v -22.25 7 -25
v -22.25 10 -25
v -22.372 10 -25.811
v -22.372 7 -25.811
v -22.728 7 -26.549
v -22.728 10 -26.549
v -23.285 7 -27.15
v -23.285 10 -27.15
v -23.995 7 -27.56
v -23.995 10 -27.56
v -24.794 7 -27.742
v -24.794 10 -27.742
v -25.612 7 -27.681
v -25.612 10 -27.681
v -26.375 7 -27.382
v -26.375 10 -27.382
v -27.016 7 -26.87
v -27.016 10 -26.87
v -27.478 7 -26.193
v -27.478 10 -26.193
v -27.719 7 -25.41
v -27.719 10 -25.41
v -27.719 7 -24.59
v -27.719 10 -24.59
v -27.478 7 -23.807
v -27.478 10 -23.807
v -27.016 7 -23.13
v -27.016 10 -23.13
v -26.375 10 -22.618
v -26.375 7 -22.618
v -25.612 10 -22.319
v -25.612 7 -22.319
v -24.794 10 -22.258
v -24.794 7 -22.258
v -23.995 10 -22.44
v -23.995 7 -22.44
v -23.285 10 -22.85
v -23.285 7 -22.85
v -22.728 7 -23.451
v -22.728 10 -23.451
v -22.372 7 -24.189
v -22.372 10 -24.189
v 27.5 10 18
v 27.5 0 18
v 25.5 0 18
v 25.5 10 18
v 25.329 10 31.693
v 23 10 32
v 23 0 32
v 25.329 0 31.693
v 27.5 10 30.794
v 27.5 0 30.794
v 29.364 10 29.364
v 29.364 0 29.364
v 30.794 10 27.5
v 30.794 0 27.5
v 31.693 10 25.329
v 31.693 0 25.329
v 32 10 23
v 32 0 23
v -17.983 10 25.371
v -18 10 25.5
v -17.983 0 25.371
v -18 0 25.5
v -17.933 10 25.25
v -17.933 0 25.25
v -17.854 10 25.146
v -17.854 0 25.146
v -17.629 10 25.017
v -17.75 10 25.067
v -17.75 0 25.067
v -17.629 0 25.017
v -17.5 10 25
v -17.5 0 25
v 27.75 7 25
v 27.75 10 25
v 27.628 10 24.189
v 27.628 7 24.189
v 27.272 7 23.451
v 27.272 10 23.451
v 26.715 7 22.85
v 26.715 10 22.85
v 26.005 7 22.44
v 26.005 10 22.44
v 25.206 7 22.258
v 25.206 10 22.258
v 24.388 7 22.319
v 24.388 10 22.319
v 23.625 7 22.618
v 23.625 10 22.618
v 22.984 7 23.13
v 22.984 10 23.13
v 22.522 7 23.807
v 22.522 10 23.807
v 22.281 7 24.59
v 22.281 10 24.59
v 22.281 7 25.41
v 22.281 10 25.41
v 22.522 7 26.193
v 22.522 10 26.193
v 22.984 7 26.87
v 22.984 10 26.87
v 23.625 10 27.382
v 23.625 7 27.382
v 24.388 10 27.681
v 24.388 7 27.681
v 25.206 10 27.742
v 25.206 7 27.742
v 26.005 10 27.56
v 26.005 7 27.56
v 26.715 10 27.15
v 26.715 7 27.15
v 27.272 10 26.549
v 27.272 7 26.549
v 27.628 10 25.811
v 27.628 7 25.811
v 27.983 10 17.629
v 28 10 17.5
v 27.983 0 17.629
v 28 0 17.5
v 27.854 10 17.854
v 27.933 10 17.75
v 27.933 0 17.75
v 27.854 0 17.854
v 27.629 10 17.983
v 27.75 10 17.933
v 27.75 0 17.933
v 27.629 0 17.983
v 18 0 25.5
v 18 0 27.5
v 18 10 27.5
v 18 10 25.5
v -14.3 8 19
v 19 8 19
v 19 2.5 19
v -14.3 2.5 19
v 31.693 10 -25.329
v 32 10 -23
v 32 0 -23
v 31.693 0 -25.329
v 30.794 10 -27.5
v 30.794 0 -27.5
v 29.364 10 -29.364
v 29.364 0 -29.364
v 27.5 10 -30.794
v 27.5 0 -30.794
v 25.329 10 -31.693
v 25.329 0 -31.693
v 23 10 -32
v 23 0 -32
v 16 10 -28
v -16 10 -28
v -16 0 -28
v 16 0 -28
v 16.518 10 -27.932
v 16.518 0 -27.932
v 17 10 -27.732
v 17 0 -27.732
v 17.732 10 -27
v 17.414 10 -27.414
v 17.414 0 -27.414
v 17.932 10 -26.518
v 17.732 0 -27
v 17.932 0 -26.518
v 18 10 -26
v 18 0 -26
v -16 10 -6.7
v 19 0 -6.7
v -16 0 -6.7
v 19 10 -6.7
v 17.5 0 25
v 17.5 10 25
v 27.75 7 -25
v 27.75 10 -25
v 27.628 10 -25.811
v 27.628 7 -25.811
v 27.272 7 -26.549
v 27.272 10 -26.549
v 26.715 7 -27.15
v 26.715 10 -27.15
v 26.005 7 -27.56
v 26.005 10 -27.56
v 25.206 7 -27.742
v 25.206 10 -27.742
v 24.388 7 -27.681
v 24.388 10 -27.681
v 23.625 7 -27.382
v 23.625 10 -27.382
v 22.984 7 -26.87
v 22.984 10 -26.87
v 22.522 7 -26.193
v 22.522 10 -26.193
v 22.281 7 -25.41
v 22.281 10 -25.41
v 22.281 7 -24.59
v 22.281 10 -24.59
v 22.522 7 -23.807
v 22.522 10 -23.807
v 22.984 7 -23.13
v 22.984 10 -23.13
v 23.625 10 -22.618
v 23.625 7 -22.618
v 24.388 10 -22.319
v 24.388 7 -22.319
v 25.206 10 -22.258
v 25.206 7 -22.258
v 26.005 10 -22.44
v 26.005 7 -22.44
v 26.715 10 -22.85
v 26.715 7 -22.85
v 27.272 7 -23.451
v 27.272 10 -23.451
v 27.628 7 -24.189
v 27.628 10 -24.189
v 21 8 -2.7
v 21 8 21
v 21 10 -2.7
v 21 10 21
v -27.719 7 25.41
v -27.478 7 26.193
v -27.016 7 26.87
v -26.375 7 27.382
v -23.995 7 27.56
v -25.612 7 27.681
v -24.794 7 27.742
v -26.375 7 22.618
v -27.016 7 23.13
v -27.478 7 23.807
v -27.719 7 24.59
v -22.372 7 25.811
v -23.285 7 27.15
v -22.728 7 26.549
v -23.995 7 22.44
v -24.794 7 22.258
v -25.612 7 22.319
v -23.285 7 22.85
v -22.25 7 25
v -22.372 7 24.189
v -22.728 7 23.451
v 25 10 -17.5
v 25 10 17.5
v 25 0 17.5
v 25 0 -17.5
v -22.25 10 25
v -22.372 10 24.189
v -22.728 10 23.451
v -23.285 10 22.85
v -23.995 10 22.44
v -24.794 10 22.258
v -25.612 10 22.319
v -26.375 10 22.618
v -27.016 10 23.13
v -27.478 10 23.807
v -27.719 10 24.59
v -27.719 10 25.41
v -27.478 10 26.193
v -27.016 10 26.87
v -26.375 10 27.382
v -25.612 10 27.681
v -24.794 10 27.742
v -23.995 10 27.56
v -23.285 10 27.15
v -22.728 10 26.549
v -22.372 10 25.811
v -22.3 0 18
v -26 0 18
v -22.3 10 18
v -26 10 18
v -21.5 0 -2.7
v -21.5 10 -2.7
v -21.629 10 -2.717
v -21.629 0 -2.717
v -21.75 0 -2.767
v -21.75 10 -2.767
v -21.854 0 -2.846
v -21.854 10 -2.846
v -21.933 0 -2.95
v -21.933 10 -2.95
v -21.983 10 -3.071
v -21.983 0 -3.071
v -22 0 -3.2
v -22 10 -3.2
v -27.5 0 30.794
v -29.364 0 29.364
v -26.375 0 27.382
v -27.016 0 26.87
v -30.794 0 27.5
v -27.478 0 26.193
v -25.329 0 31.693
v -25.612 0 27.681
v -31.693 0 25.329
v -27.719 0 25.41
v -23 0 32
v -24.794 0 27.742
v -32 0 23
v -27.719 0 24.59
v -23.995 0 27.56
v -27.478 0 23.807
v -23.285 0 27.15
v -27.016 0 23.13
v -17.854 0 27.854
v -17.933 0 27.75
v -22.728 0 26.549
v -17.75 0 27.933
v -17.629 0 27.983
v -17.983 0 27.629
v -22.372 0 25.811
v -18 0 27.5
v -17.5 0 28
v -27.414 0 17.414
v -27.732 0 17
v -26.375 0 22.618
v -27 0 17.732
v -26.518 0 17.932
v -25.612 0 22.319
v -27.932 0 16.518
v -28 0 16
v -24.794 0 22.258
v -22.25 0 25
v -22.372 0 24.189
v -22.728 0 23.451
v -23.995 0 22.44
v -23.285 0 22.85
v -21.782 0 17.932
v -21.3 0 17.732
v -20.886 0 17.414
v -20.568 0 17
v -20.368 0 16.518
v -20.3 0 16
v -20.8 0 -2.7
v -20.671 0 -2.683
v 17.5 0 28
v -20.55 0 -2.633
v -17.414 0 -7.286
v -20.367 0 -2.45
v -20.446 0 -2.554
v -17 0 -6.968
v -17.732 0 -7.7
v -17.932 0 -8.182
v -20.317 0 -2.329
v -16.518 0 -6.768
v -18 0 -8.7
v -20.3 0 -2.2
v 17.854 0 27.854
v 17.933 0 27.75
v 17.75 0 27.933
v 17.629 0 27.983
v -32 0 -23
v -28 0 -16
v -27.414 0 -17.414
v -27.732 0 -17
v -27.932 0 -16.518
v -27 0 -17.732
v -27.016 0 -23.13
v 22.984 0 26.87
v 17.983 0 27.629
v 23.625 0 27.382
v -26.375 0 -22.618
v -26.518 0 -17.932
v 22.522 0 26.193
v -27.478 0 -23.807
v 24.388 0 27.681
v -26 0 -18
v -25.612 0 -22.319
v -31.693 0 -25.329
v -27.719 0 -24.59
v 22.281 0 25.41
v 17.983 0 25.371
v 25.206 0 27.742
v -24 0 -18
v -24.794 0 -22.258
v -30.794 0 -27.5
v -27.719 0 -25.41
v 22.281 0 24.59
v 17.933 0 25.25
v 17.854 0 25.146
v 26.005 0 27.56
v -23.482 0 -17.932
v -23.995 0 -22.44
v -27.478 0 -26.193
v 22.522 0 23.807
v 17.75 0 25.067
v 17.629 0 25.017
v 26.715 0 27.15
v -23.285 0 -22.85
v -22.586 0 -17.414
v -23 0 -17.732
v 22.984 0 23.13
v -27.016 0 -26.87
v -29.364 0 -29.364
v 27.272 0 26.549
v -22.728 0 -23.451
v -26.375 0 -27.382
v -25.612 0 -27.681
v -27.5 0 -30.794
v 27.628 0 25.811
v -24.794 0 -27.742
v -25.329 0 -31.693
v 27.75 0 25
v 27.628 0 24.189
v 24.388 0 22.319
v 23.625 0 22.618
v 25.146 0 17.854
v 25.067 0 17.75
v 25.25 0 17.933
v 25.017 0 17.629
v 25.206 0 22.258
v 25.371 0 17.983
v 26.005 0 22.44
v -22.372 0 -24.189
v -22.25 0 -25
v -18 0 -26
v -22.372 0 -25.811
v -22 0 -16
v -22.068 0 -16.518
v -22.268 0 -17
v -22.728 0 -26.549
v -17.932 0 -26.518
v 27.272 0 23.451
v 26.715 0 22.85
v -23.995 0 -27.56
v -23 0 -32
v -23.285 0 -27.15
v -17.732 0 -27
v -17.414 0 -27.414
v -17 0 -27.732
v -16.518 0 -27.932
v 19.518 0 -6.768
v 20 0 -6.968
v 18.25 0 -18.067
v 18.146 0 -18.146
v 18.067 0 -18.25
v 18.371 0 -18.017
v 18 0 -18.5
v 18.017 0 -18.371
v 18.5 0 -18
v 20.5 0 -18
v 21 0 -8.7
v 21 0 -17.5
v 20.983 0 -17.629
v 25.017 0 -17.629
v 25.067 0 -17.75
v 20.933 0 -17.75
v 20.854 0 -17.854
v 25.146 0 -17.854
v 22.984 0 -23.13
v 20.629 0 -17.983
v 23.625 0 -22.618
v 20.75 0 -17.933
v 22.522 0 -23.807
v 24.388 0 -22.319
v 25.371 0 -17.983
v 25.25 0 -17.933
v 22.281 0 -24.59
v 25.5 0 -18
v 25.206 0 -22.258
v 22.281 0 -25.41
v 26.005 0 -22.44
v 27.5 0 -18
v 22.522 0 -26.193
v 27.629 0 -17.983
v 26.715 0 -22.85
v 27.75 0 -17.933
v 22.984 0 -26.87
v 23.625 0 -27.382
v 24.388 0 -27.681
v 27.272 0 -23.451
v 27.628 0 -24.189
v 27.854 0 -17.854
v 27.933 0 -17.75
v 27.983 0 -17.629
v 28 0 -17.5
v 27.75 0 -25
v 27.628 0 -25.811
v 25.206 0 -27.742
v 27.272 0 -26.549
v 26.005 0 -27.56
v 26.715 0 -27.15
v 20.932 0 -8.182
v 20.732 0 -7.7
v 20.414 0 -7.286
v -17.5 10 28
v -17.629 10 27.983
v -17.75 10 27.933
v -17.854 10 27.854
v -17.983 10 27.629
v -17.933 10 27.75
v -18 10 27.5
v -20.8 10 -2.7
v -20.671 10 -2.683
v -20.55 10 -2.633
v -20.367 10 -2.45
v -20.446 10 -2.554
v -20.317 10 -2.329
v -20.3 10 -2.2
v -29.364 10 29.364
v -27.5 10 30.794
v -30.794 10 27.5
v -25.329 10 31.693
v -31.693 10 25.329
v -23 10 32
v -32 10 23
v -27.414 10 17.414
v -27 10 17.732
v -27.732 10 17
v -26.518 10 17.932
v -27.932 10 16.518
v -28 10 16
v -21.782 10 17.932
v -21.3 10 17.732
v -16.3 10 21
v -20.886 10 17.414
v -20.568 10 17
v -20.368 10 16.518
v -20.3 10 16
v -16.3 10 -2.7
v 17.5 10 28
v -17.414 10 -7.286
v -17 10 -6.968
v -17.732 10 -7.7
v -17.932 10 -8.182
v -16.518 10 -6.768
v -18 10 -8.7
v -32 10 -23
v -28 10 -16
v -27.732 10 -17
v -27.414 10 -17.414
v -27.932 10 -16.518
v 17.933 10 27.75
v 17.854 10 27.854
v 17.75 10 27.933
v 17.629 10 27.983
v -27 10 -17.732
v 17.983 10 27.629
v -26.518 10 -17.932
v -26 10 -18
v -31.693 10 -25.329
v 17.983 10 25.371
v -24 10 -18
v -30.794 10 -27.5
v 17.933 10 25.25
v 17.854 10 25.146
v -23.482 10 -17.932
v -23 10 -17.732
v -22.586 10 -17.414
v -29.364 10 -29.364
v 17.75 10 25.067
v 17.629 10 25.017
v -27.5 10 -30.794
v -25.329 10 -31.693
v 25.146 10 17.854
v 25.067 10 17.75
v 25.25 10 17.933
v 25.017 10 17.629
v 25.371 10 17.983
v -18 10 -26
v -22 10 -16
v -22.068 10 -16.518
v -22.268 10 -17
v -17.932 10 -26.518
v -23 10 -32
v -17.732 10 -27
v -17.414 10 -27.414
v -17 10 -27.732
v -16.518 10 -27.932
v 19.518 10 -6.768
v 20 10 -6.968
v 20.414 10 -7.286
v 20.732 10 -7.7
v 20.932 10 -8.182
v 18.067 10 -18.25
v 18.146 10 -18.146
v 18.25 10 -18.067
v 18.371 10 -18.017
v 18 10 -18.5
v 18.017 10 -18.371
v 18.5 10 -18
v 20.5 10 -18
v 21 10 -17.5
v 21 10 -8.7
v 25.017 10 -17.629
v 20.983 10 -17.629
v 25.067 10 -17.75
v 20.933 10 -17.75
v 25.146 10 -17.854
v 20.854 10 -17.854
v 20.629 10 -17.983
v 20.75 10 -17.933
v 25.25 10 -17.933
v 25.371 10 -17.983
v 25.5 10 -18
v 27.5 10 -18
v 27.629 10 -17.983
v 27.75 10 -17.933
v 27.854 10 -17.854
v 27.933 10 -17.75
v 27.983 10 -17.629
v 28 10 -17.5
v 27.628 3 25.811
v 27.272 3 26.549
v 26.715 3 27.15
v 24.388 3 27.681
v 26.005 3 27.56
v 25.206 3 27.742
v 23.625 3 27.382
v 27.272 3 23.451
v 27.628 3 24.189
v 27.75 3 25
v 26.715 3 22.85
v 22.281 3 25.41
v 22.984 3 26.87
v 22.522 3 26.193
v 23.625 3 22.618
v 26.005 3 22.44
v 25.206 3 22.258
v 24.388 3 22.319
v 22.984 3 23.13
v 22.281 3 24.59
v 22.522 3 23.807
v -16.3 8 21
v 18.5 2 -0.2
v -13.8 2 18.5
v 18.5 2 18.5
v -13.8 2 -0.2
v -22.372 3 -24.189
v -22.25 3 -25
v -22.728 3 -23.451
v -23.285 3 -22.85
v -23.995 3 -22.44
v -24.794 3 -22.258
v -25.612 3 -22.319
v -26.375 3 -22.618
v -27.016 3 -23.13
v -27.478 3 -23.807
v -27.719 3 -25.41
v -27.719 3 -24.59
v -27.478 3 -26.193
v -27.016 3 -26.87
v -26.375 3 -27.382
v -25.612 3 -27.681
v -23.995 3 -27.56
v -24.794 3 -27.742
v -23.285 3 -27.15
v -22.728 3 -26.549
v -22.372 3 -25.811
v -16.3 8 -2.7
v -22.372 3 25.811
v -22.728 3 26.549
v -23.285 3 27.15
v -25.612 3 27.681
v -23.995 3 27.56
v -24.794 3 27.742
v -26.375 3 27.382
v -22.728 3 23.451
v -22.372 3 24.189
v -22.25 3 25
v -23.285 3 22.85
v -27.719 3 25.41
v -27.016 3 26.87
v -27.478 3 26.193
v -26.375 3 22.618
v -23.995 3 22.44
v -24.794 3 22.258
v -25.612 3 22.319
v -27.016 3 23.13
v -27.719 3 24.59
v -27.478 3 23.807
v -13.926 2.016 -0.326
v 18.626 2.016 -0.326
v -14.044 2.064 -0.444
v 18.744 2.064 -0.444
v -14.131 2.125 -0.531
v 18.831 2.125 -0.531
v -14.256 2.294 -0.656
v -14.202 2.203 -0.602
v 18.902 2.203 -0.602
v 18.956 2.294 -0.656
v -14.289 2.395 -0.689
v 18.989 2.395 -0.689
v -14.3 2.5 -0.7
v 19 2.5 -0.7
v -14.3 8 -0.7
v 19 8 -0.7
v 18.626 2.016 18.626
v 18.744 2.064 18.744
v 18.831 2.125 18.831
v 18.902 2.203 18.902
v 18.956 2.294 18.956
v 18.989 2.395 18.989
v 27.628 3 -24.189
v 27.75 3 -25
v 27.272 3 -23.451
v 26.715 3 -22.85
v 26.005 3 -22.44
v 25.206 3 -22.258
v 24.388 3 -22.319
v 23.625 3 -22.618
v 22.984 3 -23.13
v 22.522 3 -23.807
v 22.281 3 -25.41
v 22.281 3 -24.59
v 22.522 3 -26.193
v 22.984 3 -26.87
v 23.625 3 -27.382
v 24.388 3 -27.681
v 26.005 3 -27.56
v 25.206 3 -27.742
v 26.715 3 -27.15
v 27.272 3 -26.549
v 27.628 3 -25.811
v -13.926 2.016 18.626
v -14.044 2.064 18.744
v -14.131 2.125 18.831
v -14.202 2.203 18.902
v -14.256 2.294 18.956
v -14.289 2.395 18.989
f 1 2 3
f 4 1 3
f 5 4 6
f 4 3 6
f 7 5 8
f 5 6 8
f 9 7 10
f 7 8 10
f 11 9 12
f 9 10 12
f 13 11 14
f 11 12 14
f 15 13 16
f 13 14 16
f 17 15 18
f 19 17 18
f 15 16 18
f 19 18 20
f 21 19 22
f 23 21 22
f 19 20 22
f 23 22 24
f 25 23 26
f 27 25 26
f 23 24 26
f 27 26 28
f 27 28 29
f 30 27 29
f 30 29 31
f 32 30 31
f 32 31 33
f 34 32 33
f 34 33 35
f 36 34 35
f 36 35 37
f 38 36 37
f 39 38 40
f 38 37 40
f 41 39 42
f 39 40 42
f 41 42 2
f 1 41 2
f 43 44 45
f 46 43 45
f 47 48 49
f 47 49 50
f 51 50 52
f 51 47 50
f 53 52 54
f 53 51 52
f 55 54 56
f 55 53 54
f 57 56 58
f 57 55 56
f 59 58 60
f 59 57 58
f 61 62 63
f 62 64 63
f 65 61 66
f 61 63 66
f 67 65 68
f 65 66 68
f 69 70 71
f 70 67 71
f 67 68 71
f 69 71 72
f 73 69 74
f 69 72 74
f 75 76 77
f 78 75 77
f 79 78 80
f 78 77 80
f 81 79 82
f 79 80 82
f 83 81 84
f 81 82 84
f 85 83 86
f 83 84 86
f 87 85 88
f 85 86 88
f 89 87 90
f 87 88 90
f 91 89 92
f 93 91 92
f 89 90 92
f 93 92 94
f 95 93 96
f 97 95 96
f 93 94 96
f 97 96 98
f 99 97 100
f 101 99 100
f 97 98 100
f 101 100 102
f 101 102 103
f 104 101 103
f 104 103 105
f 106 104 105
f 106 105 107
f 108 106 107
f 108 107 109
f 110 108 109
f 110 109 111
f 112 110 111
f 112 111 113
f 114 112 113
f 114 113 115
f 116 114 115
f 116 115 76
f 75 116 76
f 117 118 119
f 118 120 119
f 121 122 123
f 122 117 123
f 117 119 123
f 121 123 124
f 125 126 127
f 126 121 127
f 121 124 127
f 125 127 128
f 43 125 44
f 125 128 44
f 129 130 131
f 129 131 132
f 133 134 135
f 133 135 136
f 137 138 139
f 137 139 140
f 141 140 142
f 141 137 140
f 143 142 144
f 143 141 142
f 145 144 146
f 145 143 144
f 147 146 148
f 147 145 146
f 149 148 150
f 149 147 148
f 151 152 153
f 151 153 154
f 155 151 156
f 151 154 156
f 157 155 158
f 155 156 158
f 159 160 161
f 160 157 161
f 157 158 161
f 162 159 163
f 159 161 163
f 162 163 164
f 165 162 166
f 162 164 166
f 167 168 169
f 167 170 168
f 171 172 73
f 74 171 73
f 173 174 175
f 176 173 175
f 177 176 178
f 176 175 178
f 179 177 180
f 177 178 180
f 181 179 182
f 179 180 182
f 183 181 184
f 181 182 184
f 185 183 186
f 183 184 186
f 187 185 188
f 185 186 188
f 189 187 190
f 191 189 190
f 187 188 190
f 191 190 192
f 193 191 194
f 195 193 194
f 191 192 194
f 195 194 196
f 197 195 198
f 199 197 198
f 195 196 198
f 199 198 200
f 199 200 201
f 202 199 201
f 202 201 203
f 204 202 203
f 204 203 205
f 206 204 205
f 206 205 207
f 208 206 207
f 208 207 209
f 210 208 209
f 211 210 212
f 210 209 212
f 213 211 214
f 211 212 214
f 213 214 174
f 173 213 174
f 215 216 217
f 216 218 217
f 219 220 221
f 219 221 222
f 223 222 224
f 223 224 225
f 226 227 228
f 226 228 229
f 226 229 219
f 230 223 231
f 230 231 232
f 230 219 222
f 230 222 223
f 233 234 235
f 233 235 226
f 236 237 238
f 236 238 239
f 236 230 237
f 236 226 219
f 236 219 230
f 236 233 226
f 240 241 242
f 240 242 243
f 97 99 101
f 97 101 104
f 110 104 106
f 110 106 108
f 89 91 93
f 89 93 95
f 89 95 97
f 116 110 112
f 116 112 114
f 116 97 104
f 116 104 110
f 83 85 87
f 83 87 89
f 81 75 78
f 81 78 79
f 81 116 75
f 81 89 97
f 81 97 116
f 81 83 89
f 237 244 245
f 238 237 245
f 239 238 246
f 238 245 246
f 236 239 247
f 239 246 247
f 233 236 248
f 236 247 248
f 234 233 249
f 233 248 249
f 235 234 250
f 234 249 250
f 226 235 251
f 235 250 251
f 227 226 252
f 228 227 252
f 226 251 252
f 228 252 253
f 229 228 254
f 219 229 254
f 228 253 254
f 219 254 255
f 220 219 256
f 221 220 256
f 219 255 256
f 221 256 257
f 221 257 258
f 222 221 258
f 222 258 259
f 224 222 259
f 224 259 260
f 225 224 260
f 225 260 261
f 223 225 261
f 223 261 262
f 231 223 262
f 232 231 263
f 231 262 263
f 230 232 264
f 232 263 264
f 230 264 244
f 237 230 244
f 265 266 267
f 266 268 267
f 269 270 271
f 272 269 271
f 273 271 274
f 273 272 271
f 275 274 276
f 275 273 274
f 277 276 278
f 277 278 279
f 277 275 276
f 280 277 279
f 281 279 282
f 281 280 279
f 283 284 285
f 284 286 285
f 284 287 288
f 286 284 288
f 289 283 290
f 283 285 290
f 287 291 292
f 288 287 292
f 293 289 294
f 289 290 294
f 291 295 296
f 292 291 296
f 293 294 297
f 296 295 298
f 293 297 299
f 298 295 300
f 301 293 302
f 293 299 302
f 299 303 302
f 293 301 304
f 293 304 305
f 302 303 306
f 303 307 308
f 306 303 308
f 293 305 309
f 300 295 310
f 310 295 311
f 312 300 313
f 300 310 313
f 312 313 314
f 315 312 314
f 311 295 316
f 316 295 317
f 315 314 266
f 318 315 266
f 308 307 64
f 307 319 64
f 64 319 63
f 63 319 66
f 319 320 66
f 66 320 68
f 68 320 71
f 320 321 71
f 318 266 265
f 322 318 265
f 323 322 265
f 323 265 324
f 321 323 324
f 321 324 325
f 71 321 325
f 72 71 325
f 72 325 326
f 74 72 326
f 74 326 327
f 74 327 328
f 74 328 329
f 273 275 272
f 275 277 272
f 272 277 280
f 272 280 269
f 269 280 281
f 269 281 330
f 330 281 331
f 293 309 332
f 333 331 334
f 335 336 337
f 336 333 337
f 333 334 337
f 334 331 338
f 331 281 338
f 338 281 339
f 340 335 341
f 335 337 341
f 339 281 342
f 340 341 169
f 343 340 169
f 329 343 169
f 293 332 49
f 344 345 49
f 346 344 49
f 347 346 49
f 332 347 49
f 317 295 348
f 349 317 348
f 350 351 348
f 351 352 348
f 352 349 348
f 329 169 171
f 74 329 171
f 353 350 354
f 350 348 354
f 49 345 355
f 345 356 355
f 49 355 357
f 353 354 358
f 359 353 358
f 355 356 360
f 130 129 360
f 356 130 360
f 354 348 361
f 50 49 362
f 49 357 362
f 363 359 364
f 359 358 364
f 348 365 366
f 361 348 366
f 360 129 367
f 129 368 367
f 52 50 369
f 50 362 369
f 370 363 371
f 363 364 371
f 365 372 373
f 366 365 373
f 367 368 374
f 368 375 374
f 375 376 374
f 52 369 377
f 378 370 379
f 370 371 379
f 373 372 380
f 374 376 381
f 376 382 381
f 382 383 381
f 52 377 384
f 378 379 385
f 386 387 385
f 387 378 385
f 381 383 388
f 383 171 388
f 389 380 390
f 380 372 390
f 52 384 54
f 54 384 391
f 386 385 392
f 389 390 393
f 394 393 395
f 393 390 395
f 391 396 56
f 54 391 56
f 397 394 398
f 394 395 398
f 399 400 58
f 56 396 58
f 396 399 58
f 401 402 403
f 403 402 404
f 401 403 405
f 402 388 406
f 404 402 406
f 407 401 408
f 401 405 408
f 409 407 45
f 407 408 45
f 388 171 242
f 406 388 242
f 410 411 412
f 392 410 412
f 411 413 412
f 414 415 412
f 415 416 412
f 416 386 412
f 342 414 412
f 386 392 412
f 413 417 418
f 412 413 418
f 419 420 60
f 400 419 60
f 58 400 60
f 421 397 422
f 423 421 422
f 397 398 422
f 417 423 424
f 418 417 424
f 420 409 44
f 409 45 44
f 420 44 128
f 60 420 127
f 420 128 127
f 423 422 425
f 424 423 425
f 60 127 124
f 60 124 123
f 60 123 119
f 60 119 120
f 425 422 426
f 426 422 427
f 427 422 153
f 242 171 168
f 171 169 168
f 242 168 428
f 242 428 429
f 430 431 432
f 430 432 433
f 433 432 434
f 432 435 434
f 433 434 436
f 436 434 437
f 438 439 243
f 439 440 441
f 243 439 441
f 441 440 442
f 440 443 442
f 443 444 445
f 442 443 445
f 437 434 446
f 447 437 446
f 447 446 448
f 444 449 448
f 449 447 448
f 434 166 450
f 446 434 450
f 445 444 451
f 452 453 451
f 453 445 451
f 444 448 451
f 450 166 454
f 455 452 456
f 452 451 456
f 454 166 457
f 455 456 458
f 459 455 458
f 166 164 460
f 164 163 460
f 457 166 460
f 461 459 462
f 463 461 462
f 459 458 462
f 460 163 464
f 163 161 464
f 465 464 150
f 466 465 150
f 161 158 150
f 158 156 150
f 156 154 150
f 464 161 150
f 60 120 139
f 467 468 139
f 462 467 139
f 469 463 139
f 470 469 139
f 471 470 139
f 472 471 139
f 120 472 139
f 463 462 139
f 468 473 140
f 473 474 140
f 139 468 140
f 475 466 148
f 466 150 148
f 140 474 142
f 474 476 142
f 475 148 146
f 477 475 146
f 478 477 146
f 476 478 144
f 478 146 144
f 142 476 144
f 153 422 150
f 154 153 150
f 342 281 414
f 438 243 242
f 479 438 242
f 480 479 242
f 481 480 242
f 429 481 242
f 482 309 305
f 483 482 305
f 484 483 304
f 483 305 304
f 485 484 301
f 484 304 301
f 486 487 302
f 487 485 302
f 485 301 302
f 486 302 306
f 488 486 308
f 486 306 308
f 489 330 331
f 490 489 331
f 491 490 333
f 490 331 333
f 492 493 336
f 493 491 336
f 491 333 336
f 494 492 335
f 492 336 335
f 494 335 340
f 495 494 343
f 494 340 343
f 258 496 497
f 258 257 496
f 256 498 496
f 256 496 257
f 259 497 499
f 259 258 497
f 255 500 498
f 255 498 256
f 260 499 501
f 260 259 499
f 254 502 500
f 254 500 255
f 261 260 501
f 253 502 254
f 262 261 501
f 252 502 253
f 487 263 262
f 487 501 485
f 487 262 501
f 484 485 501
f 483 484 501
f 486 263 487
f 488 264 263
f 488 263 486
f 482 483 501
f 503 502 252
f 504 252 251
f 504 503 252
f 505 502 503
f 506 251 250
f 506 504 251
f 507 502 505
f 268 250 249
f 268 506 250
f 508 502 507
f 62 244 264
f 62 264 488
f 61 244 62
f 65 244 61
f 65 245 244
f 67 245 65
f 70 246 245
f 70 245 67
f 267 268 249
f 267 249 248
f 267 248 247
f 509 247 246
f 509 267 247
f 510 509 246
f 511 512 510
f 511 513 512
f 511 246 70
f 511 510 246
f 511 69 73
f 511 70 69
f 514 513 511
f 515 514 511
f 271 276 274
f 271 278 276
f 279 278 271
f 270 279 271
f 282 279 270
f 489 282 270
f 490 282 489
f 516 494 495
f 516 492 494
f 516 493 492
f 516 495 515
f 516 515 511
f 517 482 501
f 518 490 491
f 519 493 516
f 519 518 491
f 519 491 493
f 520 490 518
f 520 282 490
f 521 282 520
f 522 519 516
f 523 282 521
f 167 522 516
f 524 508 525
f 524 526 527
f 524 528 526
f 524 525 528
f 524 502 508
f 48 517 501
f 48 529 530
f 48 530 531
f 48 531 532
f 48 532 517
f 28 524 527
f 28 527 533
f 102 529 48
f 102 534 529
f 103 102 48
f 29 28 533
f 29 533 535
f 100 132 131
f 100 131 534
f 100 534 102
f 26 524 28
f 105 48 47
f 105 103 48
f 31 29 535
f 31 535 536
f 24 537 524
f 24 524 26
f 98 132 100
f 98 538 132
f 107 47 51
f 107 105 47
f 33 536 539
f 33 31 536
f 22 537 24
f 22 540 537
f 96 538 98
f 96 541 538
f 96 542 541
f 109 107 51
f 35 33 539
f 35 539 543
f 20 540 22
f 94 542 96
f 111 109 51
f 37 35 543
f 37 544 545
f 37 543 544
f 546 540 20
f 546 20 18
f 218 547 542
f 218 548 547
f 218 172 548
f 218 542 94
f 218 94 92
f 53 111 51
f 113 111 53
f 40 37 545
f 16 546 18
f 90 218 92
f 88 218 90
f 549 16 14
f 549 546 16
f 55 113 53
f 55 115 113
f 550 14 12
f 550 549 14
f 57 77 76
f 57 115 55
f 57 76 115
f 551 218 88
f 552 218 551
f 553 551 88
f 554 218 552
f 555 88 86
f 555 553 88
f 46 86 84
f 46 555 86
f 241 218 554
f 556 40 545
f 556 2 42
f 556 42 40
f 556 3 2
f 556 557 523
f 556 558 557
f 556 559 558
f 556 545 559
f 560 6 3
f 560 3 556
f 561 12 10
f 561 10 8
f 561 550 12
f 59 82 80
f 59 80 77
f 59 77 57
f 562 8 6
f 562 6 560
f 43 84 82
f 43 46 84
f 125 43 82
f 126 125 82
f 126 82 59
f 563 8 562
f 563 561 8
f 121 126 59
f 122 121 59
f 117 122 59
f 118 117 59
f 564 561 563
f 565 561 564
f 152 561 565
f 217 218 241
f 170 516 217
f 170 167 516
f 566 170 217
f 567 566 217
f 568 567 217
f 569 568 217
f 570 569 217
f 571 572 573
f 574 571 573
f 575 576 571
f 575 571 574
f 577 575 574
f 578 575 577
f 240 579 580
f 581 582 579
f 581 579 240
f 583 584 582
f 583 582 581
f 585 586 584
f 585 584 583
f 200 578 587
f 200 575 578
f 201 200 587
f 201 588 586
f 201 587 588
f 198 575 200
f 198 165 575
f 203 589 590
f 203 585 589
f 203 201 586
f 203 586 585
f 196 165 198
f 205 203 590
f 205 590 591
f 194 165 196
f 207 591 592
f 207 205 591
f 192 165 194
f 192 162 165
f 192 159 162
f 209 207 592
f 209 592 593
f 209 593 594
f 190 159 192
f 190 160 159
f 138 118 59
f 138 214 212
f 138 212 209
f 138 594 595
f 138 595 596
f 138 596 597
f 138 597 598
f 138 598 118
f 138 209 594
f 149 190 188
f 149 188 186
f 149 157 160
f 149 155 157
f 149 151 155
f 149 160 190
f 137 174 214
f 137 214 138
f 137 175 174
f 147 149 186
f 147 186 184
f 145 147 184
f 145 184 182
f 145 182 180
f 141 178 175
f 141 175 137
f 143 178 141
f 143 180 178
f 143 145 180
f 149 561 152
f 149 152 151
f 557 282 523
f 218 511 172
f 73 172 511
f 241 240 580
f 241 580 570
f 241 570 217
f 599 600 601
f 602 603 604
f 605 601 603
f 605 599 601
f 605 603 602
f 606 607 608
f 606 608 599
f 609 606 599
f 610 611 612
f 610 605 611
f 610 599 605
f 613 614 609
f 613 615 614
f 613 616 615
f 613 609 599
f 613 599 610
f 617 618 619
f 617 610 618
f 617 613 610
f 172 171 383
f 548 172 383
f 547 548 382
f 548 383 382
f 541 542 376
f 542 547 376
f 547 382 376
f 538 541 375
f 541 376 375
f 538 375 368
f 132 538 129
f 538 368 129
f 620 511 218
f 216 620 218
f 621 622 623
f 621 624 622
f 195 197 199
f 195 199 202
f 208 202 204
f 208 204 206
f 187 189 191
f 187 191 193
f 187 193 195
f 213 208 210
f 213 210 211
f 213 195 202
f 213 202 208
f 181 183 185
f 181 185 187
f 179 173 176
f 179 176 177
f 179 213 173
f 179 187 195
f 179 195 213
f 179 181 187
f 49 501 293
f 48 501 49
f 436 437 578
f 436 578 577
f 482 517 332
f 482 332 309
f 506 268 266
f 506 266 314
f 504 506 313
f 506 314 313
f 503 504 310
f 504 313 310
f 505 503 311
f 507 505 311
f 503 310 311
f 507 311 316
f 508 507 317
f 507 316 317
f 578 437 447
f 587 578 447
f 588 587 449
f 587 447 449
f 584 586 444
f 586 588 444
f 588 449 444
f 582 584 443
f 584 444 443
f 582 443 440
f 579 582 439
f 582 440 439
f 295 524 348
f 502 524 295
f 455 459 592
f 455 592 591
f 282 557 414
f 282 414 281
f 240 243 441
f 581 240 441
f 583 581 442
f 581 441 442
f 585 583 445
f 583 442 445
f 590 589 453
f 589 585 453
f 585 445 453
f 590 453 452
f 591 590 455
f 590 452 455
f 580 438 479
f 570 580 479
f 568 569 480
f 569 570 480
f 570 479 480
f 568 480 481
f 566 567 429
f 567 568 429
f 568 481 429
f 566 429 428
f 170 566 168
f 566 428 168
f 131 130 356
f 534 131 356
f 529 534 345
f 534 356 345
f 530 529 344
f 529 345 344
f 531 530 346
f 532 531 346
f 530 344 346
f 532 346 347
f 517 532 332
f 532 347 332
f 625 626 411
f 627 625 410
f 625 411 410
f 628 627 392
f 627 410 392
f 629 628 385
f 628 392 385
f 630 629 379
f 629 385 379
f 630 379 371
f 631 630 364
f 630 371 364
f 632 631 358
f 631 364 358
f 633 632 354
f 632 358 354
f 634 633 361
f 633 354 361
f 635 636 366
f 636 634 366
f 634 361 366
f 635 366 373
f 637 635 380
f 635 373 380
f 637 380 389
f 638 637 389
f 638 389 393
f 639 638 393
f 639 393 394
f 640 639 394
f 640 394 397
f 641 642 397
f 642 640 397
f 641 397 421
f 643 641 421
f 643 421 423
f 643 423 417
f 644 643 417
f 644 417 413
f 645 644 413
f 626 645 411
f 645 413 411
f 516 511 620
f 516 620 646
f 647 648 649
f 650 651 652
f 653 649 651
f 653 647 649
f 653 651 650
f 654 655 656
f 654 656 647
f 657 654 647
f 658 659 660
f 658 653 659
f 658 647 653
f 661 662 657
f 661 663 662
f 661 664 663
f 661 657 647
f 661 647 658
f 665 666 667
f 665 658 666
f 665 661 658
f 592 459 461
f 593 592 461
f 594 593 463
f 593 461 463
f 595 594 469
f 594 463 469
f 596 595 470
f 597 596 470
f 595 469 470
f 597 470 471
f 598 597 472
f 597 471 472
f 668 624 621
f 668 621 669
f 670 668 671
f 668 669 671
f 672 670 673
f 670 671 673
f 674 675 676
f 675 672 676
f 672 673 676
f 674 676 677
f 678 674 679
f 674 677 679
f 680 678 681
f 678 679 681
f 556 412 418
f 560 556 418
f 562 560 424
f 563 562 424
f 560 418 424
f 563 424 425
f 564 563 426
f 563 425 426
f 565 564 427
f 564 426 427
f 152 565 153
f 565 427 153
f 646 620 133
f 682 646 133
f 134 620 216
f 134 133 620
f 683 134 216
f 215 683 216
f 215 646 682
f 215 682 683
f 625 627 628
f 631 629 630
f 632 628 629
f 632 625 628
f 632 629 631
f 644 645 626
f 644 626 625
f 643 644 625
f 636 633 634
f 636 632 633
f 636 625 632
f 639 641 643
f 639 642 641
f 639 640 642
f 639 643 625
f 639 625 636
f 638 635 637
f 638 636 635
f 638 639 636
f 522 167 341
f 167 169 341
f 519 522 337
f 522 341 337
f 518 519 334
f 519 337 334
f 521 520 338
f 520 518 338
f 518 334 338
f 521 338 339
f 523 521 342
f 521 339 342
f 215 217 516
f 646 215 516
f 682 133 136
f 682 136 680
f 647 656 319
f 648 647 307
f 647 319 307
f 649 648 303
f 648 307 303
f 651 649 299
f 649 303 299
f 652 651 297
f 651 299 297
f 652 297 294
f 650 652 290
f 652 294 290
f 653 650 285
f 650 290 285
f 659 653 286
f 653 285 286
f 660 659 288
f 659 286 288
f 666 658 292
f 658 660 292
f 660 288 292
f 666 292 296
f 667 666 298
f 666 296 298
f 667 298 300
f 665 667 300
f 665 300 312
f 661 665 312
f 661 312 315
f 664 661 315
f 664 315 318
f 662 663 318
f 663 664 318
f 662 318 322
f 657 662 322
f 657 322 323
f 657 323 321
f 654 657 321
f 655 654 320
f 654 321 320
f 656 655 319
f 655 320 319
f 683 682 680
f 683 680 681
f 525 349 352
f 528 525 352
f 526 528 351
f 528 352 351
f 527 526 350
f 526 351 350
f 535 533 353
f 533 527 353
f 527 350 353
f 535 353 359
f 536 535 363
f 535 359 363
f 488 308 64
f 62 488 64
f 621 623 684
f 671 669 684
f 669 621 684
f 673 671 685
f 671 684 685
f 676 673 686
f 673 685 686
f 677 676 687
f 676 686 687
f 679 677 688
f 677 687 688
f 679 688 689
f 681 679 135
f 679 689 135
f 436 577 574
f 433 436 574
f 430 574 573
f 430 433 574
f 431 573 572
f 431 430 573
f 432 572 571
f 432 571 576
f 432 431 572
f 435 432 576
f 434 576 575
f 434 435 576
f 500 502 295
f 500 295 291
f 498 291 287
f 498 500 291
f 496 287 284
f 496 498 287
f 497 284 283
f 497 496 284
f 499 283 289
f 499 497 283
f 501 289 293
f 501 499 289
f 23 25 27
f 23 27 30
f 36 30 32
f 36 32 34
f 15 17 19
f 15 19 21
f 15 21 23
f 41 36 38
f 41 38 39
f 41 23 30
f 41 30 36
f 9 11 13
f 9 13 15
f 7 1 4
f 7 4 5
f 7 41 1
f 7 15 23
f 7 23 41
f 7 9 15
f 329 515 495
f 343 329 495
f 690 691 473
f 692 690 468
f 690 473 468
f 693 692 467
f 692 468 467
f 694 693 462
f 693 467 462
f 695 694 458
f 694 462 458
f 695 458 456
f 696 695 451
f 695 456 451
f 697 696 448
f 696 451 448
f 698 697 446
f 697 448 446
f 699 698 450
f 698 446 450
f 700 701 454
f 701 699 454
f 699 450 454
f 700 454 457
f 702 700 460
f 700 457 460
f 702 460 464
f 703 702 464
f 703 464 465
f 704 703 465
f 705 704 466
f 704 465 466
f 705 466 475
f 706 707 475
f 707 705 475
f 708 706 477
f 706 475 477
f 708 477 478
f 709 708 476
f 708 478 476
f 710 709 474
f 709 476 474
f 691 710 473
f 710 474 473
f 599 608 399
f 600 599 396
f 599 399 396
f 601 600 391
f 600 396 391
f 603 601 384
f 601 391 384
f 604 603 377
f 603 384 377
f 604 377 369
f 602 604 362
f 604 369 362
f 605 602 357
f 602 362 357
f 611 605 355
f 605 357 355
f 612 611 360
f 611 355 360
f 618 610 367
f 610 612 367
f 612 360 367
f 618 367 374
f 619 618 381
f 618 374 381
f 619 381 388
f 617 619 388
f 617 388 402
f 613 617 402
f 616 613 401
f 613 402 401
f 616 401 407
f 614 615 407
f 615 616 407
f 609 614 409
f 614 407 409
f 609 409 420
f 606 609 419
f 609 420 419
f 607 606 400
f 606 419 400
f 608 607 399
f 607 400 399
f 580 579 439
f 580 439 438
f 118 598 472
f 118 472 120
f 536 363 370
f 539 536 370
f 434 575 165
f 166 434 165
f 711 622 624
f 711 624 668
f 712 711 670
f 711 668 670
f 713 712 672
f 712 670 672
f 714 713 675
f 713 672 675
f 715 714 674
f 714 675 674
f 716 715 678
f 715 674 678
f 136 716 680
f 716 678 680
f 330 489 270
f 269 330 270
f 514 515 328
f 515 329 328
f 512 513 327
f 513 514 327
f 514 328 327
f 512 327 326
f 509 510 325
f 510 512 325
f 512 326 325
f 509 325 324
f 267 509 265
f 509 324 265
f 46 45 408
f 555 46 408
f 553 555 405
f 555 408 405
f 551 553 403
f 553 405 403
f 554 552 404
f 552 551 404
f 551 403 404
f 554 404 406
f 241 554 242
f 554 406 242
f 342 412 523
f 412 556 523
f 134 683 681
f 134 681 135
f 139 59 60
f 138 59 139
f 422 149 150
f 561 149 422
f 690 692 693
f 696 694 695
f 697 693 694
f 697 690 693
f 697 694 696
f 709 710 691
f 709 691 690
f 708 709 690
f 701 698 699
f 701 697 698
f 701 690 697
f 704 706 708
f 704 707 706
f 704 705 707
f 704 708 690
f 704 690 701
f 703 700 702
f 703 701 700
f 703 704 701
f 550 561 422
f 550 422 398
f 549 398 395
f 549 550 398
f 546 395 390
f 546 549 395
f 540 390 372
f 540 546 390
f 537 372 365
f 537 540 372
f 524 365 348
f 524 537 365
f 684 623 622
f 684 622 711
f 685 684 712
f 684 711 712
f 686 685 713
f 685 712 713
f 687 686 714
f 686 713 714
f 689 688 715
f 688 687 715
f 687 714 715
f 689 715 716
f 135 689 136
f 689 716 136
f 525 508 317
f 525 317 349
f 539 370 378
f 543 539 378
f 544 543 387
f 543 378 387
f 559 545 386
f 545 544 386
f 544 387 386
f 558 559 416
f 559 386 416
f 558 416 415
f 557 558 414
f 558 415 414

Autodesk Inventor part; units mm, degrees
ref_plane "YZ Plane" through (0, 0, 0) normal (1, 0, 0) x (0, 1, 0)
ref_plane "XZ Plane" through (0, 0, 0) normal (0, 1, 0) x (-1, 0, 0)
sketch "Sketch1" plane through (0, 0, 0) normal (0, 1, 0) x (-1, 0, 0)
  line L0 (30, 30) -> (-30, 30)
  line L1 (-30, 30) -> (-30, -30)
  line L2 (-30, -30) -> (30, -30)
  line L3 (30, -30) -> (30, 30)
  line L4 (30, 30) -> (-30, -30) construction
  line L5 (-30, 30) -> (30, -30) construction
  point P0 (0, 0)
  dimension "d0" = 60
  dimension "d1" = 60
extrude "Extrusion1" add sketch "Sketch1" along normal blind 10
fillet "Fillet1" radius 7 4 edges at (30, 5, 30) (30, 5, -30) (-30, 5, 30) (-30, 5, -30)
sketch "Sketch2" plane through (0, 10, 0) normal (0, 1, 0) x (1, 0, 0)
  line L0 (-30, 30) -> (30, 30)
  line L1 (30, 30) -> (30, -30)
  line L2 (30, -30) -> (-30, -30)
  line L3 (-30, -30) -> (-30, 30)
  line L4 (-30, 30) -> (30, -30) construction
  line L5 (30, 30) -> (-30, -30) construction
  line L6 (25, -25) -> (25, 25)
  line L7 (25, 25) -> (-25, 25)
  line L8 (-25, 25) -> (-25, -25)
  line L9 (-25, -25) -> (25, -25)
  circle A0 centre (25, -25) radius 2.75
  circle A1 centre (-25, -25) radius 2.75
  circle A2 centre (25, 25) radius 2.75
  circle A3 centre (-25, 25) radius 2.75
  point P0 (0, 0)
  dimension "d5" = 5
  dimension "d6" = 5.5
  dimension "d7" = 5.5
  dimension "d8" = 5.5
  dimension "d9" = 5.5
extrude "Extrusion2" cut sketch "Sketch2" against normal blind 3 contours L9 A0 L6 | L6 A0 L9 | A2 L7 L6 | L6 L7 A2 | A1 L8 L9 | L9 L8 A1 | A3 L8 L7 | L7 L8 A3
sketch "Sketch7" plane through (0, 10, 0) normal (0, 1, 0) x (1, 0, 0)
  line L0 (-23, 30) -> (23, 30)
  line L1 (30, 23) -> (30, -23)
  line L2 (23, -30) -> (-23, -30)
  line L3 (-30, -23) -> (-30, 23)
  line L4 (-30, 30) -> (30, -30) construction
  line L5 (30, 30) -> (-30, -30) construction
  arc A0 (-23, 30) -> (-30, 23) centre (-23, 23) ccw
  arc A1 (-30, -23) -> (-23, -30) centre (-23, -23) ccw
  arc A2 (23, -30) -> (30, -23) centre (23, -23) ccw
  arc A3 (30, 23) -> (23, 30) centre (23, 23) ccw
  line L6 (23, 32) -> (-23, 32)
  arc A4 (-23, 32) -> (-32, 23) centre (-23, 23) ccw
  line L7 (-32, 23) -> (-32, -23)
  arc A5 (-32, -23) -> (-23, -32) centre (-23, -23) ccw
  line L8 (-23, -32) -> (23, -32)
  arc A6 (23, -32) -> (32, -23) centre (23, -23) ccw
  line L9 (32, -23) -> (32, 23)
  arc A7 (32, 23) -> (23, 32) centre (23, 23) ccw
  point P0 (0, 0)
  dimension "d47" = 7
  dimension "d48" = 2
extrude "Extrusion6" add sketch "Sketch7" against normal blind 10
sketch "Sketch14" plane through (0, 10, 0) normal (0, 1, 0) x (1, 0, 0)
  line L0 (-25, 25) -> (25, 25)
  line L1 (25, 25) -> (25, -25)
  line L2 (25, -25) -> (-25, -25)
  line L3 (-25, -25) -> (-25, 25)
  line L4 (-25, 25) -> (25, -25) construction
  line L5 (25, 25) -> (-25, -25) construction
  line L6 (21, -21) -> (21, 2.7)
  line L7 (21, 21) -> (-21, 21)
  line L8 (-21, 21) -> (-21, -21)
  line L9 (-16.3, -21) -> (21, -21)
  line L10 (-16.3, -21) -> (-16.3, 2.7)
  line L11 (21, 2.7) -> (-16.3, 2.7)
  line L12 (19, 0.7) -> (-14.3, 0.7)
  line L13 (-14.3, 0.7) -> (-14.3, -19)
  line L14 (-19, -19) -> (-19, 19)
  line L15 (-19, 19) -> (19, 19)
  line L16 (19, -19) -> (-14.3, -19)
  line L17 (19, 0.7) -> (19, -19)
  point P0 (0, 0)
  dimension "d95" = 50
  dimension "d96" = 50
  dimension "d97" = 4
  dimension "d98" = 37.3
  dimension "d99" = 23.7
  dimension "d100" = 2
extrude "Extrusion12" cut sketch "Sketch14" against normal blind 2 contours L9 L10 L11 L6
sketch "Sketch15" plane through (0, 10, 0) normal (0, 1, 0) x (1, 0, 0)
  line L0 (-14.3, 0.7) -> (19, 0.7)
  line L1 (19, 0.7) -> (19, -19)
  line L2 (19, -19) -> (-14.3, -19)
  line L3 (-14.3, -19) -> (-14.3, 0.7)
  point P0 (0, 0)
extrude "Extrusion13" cut sketch "Sketch15" against normal blind 8
sketch "Sketch16" plane through (0, 10, 0) normal (0, 1, 0) x (1, 0, 0)
  line L0 (23, 32) -> (-23, 32) projected
  line L1 (-32, 23) -> (-32, -23) projected
  line L2 (32, -23) -> (32, 23) projected
  line L3 (-18, 28) -> (18, 28)
  line L4 (-16.3, 2.7) -> (21, 2.7) projected
  line L5 (-18, 28) -> (-18, 6.7)
  line L6 (-18, 6.7) -> (18, 6.7)
  line L7 (18, 18) -> (18, 28)
  line L8 (-23, -32) -> (23, -32) projected
  line L9 (-16.3, -21) -> (-16.3, 2.7) projected
  line L10 (-28, -18) -> (-20.3, -18)
  line L11 (-20.3, -18) -> (-20.3, 2.7)
  line L12 (-28, -18) -> (-28, 18)
  line L13 (-20.3, 2.7) -> (-22, 2.7)
  line L14 (-22, 2.7) -> (-22, 6.7)
  line L15 (-28, 18) -> (-22, 18)
  line L16 (-22, 18) -> (-22, 6.7)
  line L17 (21, -21) -> (-16.3, -21) projected
  line L18 (18, -28) -> (18, -25)
  line L19 (18, -25) -> (-18, -25)
  line L20 (18, -28) -> (-18, -28)
  line L21 (-18, -28) -> (-18, -25)
  line L22 (21, 2.7) -> (21, -21) projected
  line L23 (28, 18) -> (28, -18)
  line L24 (28, -18) -> (25, -18)
  line L25 (25, -18) -> (25, 18)
  line L26 (28, 18) -> (25, 18)
  line L27 (21, 18) -> (21, 6.7)
  line L28 (21, 6.7) -> (18, 6.7)
  line L29 (21, 18) -> (18, 18)
  point P0 (0, 0)
  dimension "d106" = 4
  dimension "d107" = 4
  dimension "d108" = 14
  dimension "d109" = 14
  dimension "d110" = 4
  dimension "d111" = 4
  dimension "d112" = 4
  dimension "d113" = 14
  dimension "d114" = 4
  dimension "d115" = 14
  dimension "d116" = 4
  dimension "d117" = 4
  dimension "d118" = 4
  dimension "d119" = 4
  dimension "d120" = 4
  dimension "d121" = 14
  dimension "d122" = 4
  dimension "d123" = 14
  dimension "d124" = 4
  dimension "d125" = 14
  dimension "d126" = 4
  dimension "d127" = 4
  dimension "d128" = 14
  dimension "d129" = 4
extrude "Extrusion14" cut sketch "Sketch16" against normal through all contours L3 L7 L29 L27 L28 L6 L5 | L12 L15 L16 L14 L13 L11 L10 | L20 L21 L19 L18 | L23 L24 L25 L26
fillet "Fillet4" radius 2 8 edges at (18, 5, -28) (-22, 5, -18) (-18, 5, -28) (-28, 5, -18) (-28, 5, 18) (-18, 5, -6.7) (-20.3, 5, 18) (21, 5, -6.7)
fillet "Fillet4" radius 0.5 16 edges at (28, 5, 18) (18, 5, 28) (28, 5, -18) (21, 5, -18) (18, 5, -18) (18, 5, 25) (-20.3, 5, -2.7) (-22, 5, -2.7) (25, 5, -18) (-18, 5, 25) (-18, 5, 28) (25, 5, 18) (-14.3, 2, 9.15) (2.35, 2, -0.7) (2.35, 2, 19) (19, 2, 9.15)
ref_plane "Work Plane3" through (0, 5, 0) normal (0, 1, 0) x (1, 0, 0)
mirror "Mirror3" about plane through (0, 5, 0) normal (0, 1, 0) of "Extrusion2"
properties part number "14 pin short holder"
